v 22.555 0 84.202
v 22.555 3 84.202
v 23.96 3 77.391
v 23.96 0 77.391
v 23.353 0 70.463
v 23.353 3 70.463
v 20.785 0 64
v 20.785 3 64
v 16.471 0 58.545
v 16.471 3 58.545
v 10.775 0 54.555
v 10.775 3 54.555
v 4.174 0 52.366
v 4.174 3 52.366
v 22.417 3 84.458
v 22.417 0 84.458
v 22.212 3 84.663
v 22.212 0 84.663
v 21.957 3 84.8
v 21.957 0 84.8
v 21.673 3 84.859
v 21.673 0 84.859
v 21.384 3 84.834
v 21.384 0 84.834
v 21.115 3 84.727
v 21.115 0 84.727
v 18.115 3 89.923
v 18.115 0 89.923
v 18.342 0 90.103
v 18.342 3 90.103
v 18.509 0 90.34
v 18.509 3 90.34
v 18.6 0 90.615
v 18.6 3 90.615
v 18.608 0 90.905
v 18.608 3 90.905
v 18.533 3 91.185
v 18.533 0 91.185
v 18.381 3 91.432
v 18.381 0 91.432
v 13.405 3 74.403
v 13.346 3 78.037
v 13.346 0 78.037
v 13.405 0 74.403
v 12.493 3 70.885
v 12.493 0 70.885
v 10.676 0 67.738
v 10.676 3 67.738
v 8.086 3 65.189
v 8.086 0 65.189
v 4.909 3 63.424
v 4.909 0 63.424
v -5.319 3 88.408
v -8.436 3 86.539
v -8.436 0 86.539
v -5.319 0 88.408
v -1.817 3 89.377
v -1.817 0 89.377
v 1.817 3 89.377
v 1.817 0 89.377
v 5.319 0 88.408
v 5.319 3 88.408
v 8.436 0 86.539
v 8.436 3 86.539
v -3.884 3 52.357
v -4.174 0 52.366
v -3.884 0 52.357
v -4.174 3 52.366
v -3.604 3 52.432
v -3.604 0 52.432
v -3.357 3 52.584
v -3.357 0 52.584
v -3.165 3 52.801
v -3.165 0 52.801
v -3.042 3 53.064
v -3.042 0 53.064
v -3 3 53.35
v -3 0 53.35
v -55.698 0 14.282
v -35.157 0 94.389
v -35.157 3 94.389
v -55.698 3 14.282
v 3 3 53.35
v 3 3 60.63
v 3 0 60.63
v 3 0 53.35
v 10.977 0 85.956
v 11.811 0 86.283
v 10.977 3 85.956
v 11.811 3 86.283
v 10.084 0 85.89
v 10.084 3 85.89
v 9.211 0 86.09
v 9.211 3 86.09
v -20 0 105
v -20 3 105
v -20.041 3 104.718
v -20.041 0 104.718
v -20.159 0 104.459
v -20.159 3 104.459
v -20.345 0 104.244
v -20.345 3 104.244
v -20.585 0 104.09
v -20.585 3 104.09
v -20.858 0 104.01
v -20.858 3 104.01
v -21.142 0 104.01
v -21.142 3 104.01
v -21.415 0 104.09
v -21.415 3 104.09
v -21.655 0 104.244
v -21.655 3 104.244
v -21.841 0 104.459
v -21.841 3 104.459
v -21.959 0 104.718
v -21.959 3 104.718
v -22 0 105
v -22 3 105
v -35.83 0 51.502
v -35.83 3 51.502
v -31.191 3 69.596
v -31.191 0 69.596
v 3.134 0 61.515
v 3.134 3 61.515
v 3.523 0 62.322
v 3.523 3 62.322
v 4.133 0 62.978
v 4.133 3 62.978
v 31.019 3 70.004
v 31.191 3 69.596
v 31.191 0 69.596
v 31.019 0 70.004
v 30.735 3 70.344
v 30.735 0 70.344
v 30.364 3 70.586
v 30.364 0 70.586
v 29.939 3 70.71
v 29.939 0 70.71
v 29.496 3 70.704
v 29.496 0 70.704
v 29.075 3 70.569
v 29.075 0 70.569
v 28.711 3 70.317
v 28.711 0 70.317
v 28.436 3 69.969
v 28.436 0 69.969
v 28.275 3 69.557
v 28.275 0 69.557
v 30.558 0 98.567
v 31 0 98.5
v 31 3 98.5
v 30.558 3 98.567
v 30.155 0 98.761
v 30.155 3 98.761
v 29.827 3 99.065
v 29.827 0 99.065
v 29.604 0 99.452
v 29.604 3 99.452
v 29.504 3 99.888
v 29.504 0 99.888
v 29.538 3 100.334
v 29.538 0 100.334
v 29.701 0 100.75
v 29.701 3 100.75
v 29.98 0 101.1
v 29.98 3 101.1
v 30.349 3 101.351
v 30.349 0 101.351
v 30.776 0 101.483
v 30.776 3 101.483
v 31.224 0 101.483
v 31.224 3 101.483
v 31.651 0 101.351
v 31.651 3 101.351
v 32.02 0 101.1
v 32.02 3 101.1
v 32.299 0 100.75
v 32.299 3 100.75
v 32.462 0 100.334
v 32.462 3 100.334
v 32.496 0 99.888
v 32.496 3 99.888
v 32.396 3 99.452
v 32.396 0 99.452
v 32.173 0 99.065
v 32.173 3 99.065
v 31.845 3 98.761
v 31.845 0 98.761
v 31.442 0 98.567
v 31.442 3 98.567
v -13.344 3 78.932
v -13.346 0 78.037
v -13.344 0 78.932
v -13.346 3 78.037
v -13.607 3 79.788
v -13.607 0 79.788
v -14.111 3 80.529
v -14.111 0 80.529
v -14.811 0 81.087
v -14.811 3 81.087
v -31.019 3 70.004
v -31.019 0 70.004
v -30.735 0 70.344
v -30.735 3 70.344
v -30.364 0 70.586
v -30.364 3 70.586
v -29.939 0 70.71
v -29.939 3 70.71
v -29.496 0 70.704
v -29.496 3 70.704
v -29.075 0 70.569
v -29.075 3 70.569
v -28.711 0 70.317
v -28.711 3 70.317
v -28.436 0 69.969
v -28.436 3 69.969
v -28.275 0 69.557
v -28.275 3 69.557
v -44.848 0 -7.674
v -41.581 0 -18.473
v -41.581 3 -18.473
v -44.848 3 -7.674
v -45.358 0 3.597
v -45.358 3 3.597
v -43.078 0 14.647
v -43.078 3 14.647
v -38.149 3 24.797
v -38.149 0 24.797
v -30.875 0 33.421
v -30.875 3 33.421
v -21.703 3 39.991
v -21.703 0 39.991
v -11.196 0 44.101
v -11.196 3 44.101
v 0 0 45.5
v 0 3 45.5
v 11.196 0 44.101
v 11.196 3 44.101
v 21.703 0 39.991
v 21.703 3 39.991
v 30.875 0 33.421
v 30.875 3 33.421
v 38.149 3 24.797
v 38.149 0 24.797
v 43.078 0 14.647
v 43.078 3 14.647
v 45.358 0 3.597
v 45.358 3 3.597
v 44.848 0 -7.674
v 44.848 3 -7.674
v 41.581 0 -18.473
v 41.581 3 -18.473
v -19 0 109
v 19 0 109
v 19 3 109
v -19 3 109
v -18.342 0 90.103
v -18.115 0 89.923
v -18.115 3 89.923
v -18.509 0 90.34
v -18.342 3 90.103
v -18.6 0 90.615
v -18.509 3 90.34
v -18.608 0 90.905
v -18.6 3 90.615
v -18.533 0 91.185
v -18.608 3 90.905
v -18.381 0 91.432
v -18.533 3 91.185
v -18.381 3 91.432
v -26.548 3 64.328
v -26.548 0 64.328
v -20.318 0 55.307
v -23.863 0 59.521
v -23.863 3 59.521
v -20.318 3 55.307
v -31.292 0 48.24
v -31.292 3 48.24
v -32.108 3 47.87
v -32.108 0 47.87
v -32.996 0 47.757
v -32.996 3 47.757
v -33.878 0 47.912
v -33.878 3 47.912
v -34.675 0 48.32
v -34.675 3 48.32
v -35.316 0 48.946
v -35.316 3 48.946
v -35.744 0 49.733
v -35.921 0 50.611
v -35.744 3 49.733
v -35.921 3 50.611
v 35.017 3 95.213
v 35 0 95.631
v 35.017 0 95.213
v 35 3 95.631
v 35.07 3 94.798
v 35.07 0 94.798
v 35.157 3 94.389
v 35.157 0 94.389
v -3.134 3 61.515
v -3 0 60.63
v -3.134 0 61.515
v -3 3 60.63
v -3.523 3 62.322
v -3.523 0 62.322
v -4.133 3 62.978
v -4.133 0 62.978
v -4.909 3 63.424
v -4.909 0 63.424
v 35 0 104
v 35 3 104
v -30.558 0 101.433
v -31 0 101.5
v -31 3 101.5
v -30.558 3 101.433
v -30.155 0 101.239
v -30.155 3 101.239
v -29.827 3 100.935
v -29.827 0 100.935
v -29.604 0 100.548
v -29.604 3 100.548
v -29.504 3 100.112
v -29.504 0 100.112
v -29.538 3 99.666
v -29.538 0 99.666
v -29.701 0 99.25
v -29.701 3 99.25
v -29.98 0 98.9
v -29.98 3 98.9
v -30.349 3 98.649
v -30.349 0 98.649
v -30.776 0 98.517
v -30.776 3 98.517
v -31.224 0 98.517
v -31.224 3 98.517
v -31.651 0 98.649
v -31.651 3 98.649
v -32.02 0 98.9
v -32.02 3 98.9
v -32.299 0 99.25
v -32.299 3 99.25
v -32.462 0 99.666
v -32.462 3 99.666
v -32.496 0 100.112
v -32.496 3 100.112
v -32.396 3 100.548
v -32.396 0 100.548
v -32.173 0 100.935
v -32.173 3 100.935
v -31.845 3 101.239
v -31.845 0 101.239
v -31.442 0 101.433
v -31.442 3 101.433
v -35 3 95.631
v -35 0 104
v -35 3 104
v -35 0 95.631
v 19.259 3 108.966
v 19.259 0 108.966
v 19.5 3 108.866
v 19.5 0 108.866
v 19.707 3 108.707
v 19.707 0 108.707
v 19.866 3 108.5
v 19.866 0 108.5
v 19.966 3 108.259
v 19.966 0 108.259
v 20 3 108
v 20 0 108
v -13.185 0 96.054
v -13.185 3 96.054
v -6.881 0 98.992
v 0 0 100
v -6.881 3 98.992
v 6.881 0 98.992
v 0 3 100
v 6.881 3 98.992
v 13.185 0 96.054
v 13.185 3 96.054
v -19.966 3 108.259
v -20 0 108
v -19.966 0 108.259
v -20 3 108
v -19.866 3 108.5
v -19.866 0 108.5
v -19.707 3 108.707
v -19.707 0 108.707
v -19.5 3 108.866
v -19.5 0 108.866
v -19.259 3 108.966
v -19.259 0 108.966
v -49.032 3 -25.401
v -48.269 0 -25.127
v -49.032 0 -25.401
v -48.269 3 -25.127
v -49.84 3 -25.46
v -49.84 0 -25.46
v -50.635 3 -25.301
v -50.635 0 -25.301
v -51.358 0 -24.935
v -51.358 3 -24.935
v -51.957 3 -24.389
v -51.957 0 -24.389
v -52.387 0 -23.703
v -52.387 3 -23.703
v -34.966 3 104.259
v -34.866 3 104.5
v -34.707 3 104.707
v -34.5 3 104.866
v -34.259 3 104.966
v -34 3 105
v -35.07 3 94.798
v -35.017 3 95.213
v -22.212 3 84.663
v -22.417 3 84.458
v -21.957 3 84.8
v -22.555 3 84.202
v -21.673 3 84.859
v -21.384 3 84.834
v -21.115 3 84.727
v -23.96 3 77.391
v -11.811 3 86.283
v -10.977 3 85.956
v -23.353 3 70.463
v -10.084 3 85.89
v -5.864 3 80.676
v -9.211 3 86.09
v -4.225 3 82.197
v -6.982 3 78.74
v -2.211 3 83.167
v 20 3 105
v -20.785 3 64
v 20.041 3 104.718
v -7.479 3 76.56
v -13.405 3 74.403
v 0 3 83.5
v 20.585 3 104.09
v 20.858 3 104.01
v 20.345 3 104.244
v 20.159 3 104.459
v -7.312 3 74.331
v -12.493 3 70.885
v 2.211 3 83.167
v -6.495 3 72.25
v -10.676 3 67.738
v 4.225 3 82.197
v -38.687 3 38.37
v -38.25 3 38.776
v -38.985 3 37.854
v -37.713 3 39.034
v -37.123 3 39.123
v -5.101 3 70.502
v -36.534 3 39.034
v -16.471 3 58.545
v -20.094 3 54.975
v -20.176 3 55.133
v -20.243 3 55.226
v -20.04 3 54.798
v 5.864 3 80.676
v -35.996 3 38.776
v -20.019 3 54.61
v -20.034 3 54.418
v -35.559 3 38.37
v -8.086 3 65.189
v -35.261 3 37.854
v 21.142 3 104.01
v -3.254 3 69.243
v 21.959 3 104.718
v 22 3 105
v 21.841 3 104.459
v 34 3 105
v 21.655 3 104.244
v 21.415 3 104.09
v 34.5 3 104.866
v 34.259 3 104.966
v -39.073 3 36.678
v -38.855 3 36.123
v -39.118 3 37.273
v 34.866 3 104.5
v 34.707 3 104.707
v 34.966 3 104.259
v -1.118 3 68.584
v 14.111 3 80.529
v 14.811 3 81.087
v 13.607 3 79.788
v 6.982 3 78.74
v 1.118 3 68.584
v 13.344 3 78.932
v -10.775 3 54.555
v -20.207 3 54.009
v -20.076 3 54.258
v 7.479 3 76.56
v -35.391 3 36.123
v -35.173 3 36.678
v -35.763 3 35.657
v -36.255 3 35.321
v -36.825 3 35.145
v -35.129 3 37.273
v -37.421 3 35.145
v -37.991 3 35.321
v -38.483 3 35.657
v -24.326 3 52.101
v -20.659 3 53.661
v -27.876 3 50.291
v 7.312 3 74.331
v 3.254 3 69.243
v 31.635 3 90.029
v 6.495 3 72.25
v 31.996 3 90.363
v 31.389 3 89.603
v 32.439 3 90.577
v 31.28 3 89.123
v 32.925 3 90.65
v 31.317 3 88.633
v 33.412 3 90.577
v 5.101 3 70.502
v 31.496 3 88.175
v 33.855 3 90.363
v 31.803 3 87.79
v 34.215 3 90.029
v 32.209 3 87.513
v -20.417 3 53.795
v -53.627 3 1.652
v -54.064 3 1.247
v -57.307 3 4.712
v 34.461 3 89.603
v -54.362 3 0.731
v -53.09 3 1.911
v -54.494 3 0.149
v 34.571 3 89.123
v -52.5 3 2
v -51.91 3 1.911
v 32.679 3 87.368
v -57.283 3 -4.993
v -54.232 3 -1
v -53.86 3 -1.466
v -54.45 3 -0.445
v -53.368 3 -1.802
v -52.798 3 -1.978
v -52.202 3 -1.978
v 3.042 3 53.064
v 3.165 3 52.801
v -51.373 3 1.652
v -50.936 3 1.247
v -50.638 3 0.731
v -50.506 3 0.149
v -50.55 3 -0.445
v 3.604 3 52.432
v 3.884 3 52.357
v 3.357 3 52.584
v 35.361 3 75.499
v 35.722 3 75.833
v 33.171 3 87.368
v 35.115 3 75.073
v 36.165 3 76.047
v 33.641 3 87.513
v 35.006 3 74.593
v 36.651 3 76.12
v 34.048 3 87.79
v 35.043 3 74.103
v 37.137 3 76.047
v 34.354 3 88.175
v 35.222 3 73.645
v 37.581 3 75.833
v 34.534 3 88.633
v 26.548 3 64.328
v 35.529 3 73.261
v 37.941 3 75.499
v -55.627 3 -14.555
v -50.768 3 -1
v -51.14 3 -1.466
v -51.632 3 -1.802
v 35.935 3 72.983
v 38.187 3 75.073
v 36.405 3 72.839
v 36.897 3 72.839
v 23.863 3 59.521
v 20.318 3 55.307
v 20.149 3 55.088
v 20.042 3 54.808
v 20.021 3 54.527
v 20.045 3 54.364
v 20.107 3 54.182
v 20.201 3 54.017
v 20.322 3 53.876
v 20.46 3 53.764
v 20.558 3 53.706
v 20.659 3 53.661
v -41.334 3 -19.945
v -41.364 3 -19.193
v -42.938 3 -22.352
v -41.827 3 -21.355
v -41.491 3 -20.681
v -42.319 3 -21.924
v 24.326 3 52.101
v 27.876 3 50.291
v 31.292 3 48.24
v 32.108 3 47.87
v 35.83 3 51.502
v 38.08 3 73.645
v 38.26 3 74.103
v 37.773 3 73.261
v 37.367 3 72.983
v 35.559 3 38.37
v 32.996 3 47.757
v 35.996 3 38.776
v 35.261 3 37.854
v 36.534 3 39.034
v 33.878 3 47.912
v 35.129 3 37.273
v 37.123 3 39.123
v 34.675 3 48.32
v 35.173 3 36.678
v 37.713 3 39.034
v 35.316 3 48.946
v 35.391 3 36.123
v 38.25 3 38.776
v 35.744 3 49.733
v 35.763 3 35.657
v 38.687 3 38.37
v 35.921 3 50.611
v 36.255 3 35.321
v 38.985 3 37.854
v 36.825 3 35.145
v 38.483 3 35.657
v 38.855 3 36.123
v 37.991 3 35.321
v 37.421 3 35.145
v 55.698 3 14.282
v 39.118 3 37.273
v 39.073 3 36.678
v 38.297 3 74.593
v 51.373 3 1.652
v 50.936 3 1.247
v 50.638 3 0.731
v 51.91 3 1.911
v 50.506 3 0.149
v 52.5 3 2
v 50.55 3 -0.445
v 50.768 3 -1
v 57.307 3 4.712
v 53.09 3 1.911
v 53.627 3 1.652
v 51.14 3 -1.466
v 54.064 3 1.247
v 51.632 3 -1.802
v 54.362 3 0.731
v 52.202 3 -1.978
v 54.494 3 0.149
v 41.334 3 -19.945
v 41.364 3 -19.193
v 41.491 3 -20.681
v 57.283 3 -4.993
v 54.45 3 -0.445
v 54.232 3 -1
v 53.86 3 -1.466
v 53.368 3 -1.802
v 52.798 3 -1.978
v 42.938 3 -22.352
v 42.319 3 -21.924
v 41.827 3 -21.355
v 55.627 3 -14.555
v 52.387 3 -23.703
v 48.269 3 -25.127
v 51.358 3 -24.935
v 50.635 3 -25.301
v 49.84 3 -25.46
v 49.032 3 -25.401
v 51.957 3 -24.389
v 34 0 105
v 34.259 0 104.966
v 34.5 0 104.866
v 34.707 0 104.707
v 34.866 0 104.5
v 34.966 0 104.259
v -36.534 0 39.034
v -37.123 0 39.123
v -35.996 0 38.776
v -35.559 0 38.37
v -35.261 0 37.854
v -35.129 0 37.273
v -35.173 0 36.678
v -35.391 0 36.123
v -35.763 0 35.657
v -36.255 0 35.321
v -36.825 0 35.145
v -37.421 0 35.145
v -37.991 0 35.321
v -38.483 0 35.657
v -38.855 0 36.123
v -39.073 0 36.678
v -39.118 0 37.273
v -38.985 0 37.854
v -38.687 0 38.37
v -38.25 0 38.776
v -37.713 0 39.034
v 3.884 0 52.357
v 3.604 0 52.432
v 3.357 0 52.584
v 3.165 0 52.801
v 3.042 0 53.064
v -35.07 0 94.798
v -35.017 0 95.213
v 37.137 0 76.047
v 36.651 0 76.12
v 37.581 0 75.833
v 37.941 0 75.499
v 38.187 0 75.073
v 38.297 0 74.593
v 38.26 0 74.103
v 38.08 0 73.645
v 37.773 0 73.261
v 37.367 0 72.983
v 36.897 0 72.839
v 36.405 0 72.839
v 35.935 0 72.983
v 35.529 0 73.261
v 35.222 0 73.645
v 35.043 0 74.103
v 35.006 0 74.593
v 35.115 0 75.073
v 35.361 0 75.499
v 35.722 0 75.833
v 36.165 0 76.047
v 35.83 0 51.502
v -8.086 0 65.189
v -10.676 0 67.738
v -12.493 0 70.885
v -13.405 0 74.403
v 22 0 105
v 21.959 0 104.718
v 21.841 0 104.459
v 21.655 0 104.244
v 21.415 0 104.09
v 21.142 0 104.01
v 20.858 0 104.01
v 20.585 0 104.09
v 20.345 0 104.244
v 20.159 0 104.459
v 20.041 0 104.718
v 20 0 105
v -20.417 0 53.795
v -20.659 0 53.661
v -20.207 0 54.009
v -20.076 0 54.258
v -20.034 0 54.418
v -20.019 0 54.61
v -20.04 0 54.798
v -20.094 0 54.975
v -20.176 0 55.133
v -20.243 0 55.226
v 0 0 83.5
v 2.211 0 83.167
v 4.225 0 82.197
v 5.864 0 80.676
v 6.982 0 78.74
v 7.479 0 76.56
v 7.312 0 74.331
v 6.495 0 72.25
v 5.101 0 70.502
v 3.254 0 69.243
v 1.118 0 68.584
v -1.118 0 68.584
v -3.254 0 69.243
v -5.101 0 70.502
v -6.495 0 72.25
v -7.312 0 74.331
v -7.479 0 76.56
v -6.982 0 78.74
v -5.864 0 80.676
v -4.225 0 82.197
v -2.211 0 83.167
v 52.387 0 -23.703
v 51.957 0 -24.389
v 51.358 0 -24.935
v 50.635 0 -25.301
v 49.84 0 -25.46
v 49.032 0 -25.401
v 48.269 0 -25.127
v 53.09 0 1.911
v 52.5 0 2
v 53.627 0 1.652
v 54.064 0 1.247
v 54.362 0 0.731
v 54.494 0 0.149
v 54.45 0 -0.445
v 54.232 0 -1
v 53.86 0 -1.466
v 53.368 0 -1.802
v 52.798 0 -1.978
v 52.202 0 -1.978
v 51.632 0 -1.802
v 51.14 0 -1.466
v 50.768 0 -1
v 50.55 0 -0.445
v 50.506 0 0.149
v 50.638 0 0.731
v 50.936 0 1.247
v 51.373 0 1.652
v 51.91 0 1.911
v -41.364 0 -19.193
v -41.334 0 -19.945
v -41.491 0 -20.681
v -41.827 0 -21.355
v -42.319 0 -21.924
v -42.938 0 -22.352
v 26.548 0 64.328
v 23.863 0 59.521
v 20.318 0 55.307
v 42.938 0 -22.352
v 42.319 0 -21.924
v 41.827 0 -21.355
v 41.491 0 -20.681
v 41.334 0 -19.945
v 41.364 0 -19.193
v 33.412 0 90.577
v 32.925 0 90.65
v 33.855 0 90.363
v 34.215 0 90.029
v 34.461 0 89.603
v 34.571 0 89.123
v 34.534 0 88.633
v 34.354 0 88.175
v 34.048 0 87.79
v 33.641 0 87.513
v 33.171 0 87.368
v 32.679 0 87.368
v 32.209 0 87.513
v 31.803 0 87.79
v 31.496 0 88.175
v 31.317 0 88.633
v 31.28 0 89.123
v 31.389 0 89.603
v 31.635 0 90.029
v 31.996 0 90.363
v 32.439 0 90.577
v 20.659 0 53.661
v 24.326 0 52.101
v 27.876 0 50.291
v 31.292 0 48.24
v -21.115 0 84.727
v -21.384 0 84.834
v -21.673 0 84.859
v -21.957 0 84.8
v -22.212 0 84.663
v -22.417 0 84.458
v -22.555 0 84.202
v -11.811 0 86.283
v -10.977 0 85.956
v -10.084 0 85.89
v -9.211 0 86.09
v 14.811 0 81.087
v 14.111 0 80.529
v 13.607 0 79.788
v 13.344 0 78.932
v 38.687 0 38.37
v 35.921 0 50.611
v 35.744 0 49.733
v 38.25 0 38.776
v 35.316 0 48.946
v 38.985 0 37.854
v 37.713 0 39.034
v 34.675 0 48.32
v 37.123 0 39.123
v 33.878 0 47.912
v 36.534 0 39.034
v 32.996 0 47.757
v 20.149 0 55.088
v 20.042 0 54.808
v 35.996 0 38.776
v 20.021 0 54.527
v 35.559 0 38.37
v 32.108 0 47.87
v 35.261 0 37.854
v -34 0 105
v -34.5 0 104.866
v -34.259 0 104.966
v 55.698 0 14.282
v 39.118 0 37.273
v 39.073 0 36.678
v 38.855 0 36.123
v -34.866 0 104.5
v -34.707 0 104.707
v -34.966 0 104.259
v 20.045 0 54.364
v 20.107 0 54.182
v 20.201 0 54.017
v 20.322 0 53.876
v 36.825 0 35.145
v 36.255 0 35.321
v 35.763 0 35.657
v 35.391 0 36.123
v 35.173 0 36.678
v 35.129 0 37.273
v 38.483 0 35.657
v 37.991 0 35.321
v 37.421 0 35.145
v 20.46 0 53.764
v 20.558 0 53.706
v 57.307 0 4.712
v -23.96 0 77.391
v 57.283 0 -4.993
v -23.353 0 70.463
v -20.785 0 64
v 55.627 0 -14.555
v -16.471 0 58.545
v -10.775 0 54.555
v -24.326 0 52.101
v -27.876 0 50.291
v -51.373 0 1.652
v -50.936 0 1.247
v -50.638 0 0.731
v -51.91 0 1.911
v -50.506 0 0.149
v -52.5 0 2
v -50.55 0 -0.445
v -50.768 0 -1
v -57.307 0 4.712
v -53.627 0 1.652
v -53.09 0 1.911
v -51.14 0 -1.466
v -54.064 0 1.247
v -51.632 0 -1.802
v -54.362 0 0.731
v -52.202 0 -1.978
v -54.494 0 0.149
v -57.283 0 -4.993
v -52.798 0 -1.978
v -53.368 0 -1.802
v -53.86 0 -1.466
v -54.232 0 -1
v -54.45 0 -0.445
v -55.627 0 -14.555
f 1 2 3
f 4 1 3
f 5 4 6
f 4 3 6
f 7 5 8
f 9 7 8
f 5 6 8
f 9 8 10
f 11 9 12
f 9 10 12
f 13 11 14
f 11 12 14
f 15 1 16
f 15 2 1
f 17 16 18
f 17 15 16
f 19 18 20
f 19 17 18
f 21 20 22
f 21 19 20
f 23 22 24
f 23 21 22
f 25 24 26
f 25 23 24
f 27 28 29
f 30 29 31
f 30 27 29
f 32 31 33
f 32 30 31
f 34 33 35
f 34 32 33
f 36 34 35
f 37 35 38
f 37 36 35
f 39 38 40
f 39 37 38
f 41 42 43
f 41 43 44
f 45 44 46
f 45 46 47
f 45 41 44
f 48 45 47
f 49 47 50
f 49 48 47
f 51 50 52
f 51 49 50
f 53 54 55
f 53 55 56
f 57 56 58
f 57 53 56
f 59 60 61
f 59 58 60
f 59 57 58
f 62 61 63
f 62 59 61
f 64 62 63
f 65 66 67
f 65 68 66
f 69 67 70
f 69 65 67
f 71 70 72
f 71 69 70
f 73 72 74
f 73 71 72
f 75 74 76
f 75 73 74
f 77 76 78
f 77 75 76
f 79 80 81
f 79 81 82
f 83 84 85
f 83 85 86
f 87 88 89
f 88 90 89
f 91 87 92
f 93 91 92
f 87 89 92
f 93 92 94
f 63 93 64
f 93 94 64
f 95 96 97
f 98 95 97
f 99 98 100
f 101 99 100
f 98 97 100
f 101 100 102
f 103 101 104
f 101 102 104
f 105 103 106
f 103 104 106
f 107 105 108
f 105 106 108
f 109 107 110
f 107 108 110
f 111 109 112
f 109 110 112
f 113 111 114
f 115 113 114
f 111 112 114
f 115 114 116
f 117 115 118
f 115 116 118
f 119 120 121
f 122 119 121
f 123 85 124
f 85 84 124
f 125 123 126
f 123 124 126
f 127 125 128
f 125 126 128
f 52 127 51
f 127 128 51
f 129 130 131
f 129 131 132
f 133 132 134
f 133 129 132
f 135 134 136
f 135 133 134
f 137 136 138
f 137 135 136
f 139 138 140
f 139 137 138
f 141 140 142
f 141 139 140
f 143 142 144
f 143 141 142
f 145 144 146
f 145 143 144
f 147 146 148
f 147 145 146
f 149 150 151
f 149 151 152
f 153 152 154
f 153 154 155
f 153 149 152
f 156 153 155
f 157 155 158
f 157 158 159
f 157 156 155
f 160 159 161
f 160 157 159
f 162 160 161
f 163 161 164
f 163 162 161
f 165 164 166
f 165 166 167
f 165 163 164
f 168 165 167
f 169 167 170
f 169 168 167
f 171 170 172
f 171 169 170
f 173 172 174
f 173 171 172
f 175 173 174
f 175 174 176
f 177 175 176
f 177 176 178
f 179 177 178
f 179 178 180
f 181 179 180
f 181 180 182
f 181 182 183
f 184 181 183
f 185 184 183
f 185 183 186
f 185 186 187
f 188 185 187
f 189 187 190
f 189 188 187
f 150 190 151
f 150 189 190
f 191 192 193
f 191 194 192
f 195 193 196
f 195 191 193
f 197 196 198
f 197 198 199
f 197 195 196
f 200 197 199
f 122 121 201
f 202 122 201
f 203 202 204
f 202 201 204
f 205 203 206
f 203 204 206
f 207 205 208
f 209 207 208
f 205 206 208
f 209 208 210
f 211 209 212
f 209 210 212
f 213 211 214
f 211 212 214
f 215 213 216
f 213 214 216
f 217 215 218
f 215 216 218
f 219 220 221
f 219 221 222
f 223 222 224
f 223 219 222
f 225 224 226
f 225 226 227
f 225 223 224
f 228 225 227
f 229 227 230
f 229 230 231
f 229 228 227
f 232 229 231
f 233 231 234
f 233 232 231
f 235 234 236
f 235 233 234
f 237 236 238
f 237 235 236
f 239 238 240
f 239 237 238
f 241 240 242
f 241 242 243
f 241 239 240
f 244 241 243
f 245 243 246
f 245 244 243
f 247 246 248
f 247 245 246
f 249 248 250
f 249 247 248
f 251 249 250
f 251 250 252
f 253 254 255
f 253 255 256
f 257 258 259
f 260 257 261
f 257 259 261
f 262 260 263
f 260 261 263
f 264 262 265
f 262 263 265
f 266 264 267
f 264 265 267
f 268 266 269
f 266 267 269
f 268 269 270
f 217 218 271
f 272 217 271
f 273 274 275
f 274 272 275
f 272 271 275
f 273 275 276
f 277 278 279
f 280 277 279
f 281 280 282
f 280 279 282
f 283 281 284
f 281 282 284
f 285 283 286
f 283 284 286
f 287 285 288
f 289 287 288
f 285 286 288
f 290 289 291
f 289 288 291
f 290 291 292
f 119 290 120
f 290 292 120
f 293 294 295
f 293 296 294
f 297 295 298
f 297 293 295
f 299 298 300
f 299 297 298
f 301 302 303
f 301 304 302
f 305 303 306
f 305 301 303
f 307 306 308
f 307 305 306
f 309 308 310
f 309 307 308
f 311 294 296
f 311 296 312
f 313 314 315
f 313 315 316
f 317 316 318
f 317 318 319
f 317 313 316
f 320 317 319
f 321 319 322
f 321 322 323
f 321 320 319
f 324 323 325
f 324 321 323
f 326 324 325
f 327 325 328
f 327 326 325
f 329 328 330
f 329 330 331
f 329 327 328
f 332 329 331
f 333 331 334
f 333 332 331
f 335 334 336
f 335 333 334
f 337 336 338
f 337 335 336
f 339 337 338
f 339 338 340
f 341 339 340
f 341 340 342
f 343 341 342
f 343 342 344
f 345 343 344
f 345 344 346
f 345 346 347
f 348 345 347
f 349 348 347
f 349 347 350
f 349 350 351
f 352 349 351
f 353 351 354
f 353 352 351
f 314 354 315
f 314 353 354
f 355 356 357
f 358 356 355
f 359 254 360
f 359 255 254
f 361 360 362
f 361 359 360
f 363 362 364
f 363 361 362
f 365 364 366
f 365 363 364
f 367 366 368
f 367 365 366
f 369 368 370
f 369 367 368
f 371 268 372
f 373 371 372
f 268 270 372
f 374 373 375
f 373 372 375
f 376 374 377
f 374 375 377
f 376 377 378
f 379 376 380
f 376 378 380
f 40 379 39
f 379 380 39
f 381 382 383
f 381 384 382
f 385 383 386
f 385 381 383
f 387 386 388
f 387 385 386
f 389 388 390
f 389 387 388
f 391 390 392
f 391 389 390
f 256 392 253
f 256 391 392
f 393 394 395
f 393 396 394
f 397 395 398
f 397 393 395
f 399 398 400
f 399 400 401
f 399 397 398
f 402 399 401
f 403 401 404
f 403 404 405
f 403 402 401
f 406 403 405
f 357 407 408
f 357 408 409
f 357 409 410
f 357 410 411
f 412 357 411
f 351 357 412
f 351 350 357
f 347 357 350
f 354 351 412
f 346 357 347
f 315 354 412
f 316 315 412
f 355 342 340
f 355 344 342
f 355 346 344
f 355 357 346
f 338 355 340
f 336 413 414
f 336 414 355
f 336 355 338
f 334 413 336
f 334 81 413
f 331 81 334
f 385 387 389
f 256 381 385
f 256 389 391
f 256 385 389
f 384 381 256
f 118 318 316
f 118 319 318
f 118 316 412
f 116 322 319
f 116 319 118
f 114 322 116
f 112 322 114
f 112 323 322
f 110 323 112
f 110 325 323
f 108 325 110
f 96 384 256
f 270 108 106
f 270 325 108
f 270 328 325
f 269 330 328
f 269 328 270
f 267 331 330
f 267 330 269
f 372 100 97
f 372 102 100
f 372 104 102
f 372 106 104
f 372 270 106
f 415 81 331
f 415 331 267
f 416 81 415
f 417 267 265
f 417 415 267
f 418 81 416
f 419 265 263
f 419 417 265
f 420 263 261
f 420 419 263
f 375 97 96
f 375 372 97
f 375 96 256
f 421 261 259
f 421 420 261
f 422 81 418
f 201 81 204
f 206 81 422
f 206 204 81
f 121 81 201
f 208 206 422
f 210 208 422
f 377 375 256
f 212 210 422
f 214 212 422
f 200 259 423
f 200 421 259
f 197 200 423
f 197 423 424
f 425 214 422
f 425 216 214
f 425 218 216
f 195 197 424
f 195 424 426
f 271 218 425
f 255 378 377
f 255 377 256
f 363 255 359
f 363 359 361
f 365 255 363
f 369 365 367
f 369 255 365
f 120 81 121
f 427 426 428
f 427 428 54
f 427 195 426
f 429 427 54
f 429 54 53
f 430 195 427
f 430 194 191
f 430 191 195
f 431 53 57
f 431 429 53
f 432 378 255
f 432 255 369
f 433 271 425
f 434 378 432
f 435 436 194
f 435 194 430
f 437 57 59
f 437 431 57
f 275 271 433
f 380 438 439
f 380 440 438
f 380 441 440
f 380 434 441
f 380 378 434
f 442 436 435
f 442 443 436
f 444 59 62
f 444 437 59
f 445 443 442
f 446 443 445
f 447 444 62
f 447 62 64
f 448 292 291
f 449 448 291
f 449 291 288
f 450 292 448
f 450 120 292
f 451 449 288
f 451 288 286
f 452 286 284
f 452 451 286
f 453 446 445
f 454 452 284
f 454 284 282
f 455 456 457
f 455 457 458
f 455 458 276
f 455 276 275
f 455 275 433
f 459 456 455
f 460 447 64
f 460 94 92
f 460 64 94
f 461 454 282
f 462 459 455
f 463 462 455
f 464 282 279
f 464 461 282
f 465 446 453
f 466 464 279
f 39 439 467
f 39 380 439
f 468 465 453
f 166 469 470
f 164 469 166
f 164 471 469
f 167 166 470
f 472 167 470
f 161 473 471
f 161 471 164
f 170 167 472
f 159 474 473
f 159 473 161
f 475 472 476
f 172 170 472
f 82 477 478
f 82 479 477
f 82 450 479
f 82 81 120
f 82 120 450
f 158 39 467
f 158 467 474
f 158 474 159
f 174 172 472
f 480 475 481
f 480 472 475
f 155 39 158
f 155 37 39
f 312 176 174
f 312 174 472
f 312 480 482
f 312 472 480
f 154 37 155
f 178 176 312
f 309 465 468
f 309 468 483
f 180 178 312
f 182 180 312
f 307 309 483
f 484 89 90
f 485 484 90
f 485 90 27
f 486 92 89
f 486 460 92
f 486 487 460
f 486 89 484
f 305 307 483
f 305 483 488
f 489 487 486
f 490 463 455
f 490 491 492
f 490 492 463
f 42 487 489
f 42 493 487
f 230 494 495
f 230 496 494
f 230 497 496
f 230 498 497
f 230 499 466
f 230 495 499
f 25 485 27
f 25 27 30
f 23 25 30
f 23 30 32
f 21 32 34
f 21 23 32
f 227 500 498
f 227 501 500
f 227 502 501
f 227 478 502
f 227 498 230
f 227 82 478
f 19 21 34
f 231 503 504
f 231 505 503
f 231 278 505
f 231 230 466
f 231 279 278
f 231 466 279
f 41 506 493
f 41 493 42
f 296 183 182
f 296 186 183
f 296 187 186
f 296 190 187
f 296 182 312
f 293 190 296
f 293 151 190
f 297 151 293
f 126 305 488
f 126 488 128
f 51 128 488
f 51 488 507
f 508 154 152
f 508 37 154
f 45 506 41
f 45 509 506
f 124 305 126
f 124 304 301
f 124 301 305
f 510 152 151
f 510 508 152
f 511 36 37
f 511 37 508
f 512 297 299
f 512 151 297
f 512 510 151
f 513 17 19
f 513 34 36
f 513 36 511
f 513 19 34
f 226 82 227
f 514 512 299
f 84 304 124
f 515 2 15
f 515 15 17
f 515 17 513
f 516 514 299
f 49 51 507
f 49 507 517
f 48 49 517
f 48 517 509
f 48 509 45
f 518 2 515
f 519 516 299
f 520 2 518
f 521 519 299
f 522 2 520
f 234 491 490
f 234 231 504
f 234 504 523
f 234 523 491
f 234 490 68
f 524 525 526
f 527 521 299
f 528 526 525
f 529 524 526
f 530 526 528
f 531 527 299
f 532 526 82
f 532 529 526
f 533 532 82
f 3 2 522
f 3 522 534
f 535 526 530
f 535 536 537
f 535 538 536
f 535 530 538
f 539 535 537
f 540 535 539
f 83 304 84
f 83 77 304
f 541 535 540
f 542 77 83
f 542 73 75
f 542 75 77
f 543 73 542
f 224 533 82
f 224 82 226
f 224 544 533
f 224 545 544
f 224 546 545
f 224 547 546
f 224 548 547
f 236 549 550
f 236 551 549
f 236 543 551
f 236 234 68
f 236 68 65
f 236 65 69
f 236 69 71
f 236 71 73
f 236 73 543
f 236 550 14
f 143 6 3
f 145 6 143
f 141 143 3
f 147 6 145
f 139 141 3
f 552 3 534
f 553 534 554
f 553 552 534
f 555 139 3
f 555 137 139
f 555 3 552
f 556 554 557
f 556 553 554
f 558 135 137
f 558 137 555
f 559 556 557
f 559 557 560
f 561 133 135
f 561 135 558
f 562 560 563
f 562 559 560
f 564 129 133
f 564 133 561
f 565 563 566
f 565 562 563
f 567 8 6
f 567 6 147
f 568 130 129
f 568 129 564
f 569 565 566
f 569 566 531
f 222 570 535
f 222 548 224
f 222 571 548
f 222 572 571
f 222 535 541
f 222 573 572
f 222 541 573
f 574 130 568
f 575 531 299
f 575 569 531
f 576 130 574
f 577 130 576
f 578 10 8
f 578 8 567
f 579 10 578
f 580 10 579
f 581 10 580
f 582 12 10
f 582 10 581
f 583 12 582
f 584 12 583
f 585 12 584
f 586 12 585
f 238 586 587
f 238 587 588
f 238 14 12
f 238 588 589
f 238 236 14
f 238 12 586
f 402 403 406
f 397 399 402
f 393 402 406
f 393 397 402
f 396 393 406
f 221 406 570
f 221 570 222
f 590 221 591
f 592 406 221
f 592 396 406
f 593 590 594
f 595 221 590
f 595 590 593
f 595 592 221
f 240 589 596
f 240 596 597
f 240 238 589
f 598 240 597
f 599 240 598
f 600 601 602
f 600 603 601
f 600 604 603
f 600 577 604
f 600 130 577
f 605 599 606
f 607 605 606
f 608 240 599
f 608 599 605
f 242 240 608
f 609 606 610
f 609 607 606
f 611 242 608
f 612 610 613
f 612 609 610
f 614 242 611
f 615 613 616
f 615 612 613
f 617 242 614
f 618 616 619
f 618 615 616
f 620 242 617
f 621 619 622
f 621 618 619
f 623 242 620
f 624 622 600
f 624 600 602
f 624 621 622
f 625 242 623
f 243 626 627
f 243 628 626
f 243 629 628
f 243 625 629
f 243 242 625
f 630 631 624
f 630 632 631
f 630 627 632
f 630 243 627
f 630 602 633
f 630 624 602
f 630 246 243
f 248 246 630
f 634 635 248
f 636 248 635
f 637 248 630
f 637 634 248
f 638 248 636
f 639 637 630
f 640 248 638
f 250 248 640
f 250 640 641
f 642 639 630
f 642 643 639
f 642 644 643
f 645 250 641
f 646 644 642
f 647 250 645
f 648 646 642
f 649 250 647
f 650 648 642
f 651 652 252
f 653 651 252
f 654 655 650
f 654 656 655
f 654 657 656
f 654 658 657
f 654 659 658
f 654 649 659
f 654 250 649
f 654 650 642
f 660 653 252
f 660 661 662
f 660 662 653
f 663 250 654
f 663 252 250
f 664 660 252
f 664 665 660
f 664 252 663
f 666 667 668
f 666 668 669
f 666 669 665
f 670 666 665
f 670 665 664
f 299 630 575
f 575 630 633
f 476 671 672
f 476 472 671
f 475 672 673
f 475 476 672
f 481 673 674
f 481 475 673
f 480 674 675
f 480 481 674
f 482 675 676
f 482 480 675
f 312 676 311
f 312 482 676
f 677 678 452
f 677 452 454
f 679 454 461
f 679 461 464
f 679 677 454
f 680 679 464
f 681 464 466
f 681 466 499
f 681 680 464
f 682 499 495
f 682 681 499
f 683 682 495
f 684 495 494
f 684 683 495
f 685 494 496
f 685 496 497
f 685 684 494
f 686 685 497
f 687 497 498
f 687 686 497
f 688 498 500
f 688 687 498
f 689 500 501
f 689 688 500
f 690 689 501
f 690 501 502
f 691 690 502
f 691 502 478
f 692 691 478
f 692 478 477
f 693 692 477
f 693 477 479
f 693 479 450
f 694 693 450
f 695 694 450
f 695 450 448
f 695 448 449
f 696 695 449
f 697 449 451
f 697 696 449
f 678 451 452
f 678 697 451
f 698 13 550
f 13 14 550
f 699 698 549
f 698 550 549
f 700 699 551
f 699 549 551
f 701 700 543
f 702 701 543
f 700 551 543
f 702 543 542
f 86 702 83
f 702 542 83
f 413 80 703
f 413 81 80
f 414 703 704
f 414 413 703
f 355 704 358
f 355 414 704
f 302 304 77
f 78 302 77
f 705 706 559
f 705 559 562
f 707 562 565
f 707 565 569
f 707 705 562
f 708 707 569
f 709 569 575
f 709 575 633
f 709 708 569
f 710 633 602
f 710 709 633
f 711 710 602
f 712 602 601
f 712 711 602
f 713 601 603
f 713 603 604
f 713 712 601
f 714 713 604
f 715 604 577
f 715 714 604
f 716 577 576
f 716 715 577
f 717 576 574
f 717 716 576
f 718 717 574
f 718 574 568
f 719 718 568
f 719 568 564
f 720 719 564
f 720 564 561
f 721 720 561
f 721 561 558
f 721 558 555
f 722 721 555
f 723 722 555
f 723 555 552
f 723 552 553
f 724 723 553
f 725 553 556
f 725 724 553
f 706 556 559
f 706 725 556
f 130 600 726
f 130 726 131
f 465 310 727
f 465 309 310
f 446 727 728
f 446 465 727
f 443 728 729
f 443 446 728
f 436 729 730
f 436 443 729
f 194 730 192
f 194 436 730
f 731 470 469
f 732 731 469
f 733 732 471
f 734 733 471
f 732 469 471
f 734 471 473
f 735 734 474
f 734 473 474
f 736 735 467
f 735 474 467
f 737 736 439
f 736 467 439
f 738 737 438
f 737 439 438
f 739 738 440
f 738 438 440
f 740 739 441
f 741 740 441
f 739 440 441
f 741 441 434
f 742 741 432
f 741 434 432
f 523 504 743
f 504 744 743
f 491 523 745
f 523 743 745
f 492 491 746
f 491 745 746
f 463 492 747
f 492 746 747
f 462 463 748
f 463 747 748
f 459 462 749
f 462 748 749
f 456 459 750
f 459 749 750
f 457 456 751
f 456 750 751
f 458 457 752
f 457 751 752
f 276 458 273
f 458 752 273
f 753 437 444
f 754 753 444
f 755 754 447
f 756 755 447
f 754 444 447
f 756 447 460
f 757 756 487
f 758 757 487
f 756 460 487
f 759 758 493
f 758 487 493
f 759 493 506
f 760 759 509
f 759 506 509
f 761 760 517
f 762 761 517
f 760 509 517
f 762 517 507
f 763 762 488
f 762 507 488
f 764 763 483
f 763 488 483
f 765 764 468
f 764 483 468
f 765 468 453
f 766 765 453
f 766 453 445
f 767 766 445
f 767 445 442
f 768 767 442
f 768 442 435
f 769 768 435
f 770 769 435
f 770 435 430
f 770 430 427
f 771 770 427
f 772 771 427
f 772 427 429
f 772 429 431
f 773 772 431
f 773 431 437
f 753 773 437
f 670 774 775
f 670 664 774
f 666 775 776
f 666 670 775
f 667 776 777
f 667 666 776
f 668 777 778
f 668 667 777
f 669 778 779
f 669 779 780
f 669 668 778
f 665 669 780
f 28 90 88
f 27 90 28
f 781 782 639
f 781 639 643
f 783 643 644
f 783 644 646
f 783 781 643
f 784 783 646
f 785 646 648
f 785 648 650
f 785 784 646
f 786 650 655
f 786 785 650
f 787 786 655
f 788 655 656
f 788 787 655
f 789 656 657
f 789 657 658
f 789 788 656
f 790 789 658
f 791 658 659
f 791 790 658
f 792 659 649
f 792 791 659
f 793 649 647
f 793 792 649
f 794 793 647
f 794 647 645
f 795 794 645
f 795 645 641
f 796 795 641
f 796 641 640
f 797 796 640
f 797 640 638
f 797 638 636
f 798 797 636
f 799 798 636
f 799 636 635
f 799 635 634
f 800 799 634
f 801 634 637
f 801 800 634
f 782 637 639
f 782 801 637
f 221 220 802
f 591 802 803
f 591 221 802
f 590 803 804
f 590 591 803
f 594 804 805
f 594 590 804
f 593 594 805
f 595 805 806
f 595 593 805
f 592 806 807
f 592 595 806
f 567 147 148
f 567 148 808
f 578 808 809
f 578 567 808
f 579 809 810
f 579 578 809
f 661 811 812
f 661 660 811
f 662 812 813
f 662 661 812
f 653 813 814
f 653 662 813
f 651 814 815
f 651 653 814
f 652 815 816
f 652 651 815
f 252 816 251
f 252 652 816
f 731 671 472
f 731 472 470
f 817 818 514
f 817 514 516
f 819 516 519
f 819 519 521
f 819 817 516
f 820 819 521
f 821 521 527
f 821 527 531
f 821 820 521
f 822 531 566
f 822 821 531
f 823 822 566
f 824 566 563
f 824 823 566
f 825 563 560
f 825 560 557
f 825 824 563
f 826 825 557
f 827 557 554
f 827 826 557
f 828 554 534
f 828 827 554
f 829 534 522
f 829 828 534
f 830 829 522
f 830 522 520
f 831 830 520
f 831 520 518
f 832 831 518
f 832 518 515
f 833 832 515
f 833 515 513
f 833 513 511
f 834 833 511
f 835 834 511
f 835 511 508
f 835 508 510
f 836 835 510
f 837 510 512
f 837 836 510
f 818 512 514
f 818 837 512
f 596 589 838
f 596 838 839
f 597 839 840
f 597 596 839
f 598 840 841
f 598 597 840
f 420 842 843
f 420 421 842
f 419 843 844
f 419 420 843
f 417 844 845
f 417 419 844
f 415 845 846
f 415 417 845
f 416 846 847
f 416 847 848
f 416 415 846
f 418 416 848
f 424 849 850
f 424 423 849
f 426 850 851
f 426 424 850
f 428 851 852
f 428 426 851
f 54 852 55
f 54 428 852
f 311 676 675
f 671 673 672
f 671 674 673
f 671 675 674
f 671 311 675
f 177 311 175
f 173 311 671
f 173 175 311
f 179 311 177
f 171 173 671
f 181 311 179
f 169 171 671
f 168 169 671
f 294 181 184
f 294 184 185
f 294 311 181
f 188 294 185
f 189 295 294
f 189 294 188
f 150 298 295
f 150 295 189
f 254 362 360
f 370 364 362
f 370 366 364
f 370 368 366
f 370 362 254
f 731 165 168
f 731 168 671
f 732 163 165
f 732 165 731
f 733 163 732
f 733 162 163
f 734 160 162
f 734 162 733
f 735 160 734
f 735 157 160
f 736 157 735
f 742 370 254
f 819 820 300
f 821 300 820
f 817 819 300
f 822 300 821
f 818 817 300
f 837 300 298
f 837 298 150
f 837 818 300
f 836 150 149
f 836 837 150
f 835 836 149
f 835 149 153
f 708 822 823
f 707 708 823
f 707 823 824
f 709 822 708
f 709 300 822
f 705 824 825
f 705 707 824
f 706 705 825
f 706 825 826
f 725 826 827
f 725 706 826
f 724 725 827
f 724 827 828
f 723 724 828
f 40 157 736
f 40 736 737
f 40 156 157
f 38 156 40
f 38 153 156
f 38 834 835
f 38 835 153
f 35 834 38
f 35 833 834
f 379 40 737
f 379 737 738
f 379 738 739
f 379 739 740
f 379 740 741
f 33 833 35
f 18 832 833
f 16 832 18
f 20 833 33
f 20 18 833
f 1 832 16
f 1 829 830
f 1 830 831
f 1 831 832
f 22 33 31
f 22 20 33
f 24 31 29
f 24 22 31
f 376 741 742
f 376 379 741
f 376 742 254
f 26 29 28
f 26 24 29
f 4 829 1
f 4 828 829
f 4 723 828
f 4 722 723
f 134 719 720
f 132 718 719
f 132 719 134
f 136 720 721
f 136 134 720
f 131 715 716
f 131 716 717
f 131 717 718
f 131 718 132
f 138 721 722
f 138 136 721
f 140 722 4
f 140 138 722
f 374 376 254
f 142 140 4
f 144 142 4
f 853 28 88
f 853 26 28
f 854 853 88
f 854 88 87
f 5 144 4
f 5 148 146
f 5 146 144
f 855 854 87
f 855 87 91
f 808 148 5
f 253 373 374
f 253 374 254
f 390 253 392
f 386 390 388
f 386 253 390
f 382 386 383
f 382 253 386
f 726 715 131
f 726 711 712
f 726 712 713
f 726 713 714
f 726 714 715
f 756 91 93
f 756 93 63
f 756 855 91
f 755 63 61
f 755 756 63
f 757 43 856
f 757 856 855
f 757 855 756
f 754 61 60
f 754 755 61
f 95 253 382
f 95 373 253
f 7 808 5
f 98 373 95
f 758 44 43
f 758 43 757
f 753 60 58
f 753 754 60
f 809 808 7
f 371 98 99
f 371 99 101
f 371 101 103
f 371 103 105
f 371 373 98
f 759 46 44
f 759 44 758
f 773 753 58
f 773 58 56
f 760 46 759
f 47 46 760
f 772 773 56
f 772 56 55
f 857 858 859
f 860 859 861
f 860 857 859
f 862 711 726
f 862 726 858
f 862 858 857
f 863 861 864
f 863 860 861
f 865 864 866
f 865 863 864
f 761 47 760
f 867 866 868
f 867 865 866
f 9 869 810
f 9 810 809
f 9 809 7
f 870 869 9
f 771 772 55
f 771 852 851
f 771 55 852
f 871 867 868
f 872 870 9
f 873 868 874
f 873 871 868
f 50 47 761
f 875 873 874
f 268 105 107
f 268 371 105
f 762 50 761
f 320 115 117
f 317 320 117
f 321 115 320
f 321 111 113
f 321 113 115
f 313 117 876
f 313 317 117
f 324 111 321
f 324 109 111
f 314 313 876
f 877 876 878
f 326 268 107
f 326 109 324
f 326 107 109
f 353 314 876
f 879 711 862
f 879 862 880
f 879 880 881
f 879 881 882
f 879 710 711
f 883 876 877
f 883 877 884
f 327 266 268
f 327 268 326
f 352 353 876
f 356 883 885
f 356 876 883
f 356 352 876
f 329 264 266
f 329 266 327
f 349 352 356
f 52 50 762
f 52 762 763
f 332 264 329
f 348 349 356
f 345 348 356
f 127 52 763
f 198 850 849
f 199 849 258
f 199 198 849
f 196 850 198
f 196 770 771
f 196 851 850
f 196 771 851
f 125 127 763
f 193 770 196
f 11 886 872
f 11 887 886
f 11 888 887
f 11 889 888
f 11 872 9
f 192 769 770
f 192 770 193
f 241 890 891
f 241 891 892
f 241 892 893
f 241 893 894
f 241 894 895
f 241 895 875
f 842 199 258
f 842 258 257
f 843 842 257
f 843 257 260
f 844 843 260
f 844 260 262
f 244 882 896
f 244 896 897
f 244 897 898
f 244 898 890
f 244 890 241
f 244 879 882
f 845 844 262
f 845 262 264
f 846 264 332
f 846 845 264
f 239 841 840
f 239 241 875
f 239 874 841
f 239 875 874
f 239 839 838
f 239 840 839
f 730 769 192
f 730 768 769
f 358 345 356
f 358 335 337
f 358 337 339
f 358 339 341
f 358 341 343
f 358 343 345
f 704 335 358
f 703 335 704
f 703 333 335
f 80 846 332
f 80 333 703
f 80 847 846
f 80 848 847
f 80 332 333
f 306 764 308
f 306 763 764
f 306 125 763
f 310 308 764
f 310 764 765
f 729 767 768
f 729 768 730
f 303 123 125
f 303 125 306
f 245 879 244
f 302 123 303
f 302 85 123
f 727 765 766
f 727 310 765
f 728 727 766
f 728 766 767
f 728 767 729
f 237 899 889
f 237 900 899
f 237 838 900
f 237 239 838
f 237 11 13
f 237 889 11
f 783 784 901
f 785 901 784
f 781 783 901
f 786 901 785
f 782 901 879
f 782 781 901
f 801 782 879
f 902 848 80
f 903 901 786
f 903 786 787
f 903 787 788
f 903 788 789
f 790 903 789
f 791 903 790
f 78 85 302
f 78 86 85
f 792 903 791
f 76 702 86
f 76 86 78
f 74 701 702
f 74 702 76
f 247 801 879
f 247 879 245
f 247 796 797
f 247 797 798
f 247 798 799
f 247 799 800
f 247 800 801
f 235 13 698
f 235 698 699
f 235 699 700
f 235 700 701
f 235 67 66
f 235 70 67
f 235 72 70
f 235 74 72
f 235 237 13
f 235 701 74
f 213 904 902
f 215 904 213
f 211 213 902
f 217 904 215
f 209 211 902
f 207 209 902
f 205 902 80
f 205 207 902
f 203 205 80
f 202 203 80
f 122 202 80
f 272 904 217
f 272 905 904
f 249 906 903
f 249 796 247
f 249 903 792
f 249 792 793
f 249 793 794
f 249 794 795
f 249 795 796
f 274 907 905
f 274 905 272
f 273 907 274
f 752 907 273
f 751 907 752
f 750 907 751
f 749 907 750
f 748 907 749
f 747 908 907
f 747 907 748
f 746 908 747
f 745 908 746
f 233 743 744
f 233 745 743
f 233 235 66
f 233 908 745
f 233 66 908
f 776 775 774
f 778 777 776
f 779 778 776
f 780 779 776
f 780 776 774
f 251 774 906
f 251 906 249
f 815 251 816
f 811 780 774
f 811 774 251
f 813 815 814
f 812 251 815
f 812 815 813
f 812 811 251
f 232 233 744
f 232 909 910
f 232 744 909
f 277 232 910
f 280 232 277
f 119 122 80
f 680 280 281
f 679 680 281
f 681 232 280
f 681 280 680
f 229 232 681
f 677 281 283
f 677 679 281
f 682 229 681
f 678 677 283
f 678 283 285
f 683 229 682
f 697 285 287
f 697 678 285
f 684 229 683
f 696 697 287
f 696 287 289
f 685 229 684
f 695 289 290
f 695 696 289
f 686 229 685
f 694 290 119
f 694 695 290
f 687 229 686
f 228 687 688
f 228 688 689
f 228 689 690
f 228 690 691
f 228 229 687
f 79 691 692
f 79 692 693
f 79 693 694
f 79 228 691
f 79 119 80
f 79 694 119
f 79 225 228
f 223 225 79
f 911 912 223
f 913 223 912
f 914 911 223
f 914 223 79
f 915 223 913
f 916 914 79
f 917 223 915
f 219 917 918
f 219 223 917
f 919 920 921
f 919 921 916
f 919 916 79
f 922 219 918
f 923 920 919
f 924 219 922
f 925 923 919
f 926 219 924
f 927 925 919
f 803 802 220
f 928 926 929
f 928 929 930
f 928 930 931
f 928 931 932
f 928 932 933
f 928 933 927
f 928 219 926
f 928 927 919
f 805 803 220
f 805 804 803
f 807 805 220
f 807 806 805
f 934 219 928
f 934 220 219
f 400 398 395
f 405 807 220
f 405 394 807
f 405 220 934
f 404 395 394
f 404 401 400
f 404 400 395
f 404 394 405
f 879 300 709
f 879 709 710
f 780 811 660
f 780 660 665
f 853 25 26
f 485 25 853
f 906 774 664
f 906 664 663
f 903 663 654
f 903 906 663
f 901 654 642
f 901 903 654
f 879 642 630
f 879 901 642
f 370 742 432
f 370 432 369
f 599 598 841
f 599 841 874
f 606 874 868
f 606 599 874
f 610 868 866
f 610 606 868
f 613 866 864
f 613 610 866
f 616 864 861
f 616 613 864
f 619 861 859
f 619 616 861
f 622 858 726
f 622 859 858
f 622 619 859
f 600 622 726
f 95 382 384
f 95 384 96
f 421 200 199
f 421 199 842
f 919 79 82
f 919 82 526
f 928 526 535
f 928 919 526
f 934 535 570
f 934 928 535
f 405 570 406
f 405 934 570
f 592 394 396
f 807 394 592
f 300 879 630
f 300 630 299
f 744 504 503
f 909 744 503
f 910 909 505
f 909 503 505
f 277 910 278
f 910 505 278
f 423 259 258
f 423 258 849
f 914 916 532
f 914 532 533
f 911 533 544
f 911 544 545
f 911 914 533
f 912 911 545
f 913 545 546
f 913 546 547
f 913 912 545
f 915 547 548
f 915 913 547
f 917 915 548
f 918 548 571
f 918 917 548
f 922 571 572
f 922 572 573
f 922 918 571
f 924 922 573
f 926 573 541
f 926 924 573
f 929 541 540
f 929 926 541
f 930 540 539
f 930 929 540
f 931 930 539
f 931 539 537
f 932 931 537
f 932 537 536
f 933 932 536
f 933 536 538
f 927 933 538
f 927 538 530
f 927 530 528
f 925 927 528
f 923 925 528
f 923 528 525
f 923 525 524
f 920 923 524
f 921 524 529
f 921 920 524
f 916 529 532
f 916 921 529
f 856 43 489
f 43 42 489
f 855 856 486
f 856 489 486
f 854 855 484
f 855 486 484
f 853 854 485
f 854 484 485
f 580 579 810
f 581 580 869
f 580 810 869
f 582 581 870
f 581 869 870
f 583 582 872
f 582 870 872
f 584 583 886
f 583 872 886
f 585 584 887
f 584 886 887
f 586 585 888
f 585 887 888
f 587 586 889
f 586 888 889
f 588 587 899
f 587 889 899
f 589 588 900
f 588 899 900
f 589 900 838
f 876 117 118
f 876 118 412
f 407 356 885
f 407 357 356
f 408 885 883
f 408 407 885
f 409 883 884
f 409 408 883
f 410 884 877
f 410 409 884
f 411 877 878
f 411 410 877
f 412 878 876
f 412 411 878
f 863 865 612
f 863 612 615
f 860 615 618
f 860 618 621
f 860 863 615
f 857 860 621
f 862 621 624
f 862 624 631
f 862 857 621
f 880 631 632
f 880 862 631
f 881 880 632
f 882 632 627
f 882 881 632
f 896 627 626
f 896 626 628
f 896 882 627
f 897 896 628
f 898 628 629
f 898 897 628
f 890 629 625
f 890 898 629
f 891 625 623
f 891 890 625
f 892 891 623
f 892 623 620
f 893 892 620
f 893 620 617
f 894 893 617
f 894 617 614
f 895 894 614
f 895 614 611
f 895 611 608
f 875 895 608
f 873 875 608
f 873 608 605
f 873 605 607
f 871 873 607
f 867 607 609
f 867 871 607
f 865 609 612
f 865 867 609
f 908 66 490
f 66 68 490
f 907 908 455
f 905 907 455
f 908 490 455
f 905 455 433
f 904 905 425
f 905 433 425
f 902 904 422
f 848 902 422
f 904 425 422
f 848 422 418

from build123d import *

# Parameters (mm, degrees)
SKETCH_1_R          = 1.5
SKETCH_1_R_2        = 2
SKETCH_1_R_3        = 1.65
EXTRUDE_1_DEPTH     = 3
SKETCH_3_R          = 1
CUT_EXTRUDE_3_DEPTH = 124.273070863
SKETCH_4_R          = 24
SKETCH_4_R_2        = 13.5
SKETCH_4_R_3        = 7.5
CUT_EXTRUDE_4_DEPTH = 124.273070863
SKETCH_5_W          = 6
SKETCH_5_H          = 16.5
EXTRUDE_1_2_DEPTH   = 3
FILLET_4_R          = 1
FILLET_6_R          = 5
FILLET_7_R          = 3


with BuildPart() as part:
    # 草图1 → Extrude 1 (new body)
    with BuildSketch(Plane(origin=(0, 0, 0), x_dir=(1, 0, 0), z_dir=(0, 1, 0))):
        with BuildLine():
            Line((-51.003122908, 26.550545261), (-40.35899291, 21.009561902))
            ThreePointArc((-40.35899291, 21.009561902), (0, -45.5), (40.35899291, 21.009561902))
            Line((40.35899291, 21.009561902), (51.003122908, 26.550545261))
            ThreePointArc((51.003122908, 26.550545261), (57.123657521, 6.567933576), (55.697982668, -14.282322175))
            Line((55.697982668, -14.282322175), (35, -95))
            Line((35, -95), (35, -105))
            Line((35, -105), (20, -105))
            Line((20, -105), (20, -109))
            Line((20, -109), (-20, -109))
            Line((-20, -109), (-20, -105))
            Line((-20, -105), (-35, -105))
            Line((-35, -105), (-35, -95))
            Line((-35, -95), (-55.697982668, -14.282322175))
            ThreePointArc((-55.697982668, -14.282322175), (-57.123657521, 6.567933576), (-51.003122908, 26.550545261))
        make_face()
        with Locations(Location((-31, -100, 0), (0, 0, 270))):
            Circle(SKETCH_1_R, mode=Mode.SUBTRACT)
        with Locations(Location((31, -100, 0), (0, 0, 90))):
            Circle(SKETCH_1_R, mode=Mode.SUBTRACT)
        with Locations(Location((-37.123106012, -37.123106012, 0), (0, 0, 270))):
            Circle(SKETCH_1_R_2, mode=Mode.SUBTRACT)
        with Locations(Location((-52.5, 0, 0), (0, 0, 270))):
            Circle(SKETCH_1_R_2, mode=Mode.SUBTRACT)
        with Locations(Location((52.5, 0, 0), (0, 0, 270))):
            Circle(SKETCH_1_R_2, mode=Mode.SUBTRACT)
        with Locations(Location((37.123106012, -37.123106012, 0), (0, 0, 270))):
            Circle(SKETCH_1_R_2, mode=Mode.SUBTRACT)
        with Locations(Location((32.925309654, -89, 0), (0, 0, 270))):
            Circle(SKETCH_1_R_3, mode=Mode.SUBTRACT)
        with Locations(Location((36.65113283, -74.470091478, 0), (0, 0, 270))):
            Circle(SKETCH_1_R_3, mode=Mode.SUBTRACT)
    extrude(amount=EXTRUDE_1_DEPTH)

    # 草图3 → 切除-拉伸3 (cut, through all)
    with BuildSketch(Plane(origin=(0, 3, 0), x_dir=(1, 0, 0), z_dir=(0, 1, 0))):
        with Locations((-21, -105)):
            Circle(SKETCH_3_R)
        with Locations((21, -105)):
            Circle(SKETCH_3_R)
    extrude(amount=-CUT_EXTRUDE_3_DEPTH, mode=Mode.SUBTRACT)

    # 草图4 → 切除-拉伸4 (cut, through all)
    # profile 1 of 4: a face of its own
    with BuildSketch(Plane(origin=(0, 3, 0), x_dir=(1, 0, 0), z_dir=(0, 1, 0))):
        with Locations(Location((0, -76, 0), (0, 0, 270))):
            Circle(SKETCH_4_R)
        with Locations(Location((0, -76, 0), (0, 0, 270))):
            Circle(SKETCH_4_R_2, mode=Mode.SUBTRACT)
    # profile 2 of 4: a face of its own
    with BuildSketch(Plane(origin=(0, 3, 0), x_dir=(1, 0, 0), z_dir=(0, 1, 0))):
        with Locations(Location((0, -76, 0), (0, 0, 270))):
            Circle(SKETCH_4_R_3)
    # profile 3 of 4: a face of its own
    with BuildSketch(Plane(origin=(0, 3, 0), x_dir=(1, 0, 0), z_dir=(0, 1, 0))):
        with BuildLine():
            Line((-35.830489881, -51.50170866), (-31.190656418, -69.59606059))
            ThreePointArc((-31.190656418, -69.59606059), (-29.717442346, -70.72334194), (-28.275157423, -69.556749833))
            ThreePointArc((-28.275157423, -69.556749833), (-24.920071276, -61.167938525), (-19.146204544, -54.21875))
            ThreePointArc((-19.146204544, -54.21875), (-25.395621297, -51.58790962), (-31.291887936, -48.239690602))
            ThreePointArc((-31.291887936, -48.239690602), (-34.67538019, -48.320471942), (-35.830489881, -51.50170866))
        make_face()
    # profile 4 of 4: a face of its own
    with BuildSketch(Plane(origin=(0, 3, 0), x_dir=(1, 0, 0), z_dir=(0, 1, 0))):
        with BuildLine():
            Line((35.830489881, -51.50170866), (31.190656418, -69.59606059))
            ThreePointArc((31.190656418, -69.59606059), (29.717442346, -70.72334194), (28.275157423, -69.556749833))
            ThreePointArc((28.275157423, -69.556749833), (24.920071276, -61.167938525), (19.146204544, -54.21875))
            ThreePointArc((19.146204544, -54.21875), (25.395621297, -51.58790962), (31.291887936, -48.239690602))
            ThreePointArc((31.291887936, -48.239690602), (34.67538019, -48.320471942), (35.830489881, -51.50170866))
        make_face()
    extrude(amount=-CUT_EXTRUDE_4_DEPTH, mode=Mode.SUBTRACT)


with BuildPart() as cut_extrude_4_piece_1:
    # of the separate pieces the step leaves, piece 1, a body of its own (cut_extrude_4_pieces)
    add(part.part.solids().sort_by_distance((-51.003122908, 0, -26.550545261))[0])



with BuildPart() as cut_extrude_4_piece_2:
    # of the separate pieces the step leaves, piece 2, a body of its own (cut_extrude_4_pieces)
    add(part.part.solids().sort_by_distance((0, 0, 89.5))[0])


with BuildPart() as cut_extrude_4_piece_1_1:
    add(cut_extrude_4_piece_1.part)

    add(cut_extrude_4_piece_2.part)  # Extrude 1 2 merges 切除-拉伸4 piece 2
    # 草图5 → Extrude 1 2 (add)
    with BuildSketch(Plane(origin=(0, 3, 0), x_dir=(1, 0, 0), z_dir=(0, 1, 0))):
        with Locations((0, -60.25)):
            Rectangle(SKETCH_5_W, SKETCH_5_H)
        Polygon((22.284609691, -85.401923789), (7.995190528, -77.151923789), (4.995190528, -82.348076211), (19.284609691, -90.598076211), align=None)
        Polygon((-19.284609691, -90.598076211), (-4.995190528, -82.348076211), (-7.995190528, -77.151923789), (-22.284609691, -85.401923789), align=None)
    extrude(amount=-EXTRUDE_1_2_DEPTH)

    # 圆角4
    fillet_4_edges = [cut_extrude_4_piece_1_1.edges().sort_by_distance(p)[0] for p in [
        (19.121590627, 1.5, 90.503957111),
        (22.121590627, 1.5, 85.307804688),
        (-19.146204544, 1.5, 54.21875),
        (19.146204544, 1.5, 54.21875),
        (-22.121590627, 1.5, 85.307804688),
        (-19.121590627, 1.5, 90.503957111),
        (3, 1.5, 52.1882382),
        (-3, 1.5, 52.1882382),
        (-35, 1.5, 105),
        (-20, 1.5, 109),
        (20, 1.5, 109),
        (35, 1.5, 105),
    ]]
    fillet(fillet_4_edges, radius=FILLET_4_R)

    # 圆角6
    fillet_6_edges = [cut_extrude_4_piece_1_1.edges().sort_by_distance(p)[0] for p in [
        (-35, 1.5, 95),
        (35, 1.5, 95),
    ]]
    fillet(fillet_6_edges, radius=FILLET_6_R)

    # 圆角7
    fillet_7_edges = [cut_extrude_4_piece_1_1.edges().sort_by_distance(p)[0] for p in [
        (9.899013115, 1.5, 85.179299502),
        (12.899013115, 1.5, 79.983147079),
        (-9.899013115, 1.5, 85.179299502),
        (-12.899013115, 1.5, 79.983147079),
        (51.003122908, 1.5, -26.550545261),
        (3, 1.5, 62.837553419),
        (40.35899291, 1.5, -21.009561902),
        (-40.35899291, 1.5, -21.009561902),
        (-3, 1.5, 62.837553419),
        (-51.003122908, 1.5, -26.550545261),
    ]]
    fillet(fillet_7_edges, radius=FILLET_7_R)


solid = cut_extrude_4_piece_1_1.part
